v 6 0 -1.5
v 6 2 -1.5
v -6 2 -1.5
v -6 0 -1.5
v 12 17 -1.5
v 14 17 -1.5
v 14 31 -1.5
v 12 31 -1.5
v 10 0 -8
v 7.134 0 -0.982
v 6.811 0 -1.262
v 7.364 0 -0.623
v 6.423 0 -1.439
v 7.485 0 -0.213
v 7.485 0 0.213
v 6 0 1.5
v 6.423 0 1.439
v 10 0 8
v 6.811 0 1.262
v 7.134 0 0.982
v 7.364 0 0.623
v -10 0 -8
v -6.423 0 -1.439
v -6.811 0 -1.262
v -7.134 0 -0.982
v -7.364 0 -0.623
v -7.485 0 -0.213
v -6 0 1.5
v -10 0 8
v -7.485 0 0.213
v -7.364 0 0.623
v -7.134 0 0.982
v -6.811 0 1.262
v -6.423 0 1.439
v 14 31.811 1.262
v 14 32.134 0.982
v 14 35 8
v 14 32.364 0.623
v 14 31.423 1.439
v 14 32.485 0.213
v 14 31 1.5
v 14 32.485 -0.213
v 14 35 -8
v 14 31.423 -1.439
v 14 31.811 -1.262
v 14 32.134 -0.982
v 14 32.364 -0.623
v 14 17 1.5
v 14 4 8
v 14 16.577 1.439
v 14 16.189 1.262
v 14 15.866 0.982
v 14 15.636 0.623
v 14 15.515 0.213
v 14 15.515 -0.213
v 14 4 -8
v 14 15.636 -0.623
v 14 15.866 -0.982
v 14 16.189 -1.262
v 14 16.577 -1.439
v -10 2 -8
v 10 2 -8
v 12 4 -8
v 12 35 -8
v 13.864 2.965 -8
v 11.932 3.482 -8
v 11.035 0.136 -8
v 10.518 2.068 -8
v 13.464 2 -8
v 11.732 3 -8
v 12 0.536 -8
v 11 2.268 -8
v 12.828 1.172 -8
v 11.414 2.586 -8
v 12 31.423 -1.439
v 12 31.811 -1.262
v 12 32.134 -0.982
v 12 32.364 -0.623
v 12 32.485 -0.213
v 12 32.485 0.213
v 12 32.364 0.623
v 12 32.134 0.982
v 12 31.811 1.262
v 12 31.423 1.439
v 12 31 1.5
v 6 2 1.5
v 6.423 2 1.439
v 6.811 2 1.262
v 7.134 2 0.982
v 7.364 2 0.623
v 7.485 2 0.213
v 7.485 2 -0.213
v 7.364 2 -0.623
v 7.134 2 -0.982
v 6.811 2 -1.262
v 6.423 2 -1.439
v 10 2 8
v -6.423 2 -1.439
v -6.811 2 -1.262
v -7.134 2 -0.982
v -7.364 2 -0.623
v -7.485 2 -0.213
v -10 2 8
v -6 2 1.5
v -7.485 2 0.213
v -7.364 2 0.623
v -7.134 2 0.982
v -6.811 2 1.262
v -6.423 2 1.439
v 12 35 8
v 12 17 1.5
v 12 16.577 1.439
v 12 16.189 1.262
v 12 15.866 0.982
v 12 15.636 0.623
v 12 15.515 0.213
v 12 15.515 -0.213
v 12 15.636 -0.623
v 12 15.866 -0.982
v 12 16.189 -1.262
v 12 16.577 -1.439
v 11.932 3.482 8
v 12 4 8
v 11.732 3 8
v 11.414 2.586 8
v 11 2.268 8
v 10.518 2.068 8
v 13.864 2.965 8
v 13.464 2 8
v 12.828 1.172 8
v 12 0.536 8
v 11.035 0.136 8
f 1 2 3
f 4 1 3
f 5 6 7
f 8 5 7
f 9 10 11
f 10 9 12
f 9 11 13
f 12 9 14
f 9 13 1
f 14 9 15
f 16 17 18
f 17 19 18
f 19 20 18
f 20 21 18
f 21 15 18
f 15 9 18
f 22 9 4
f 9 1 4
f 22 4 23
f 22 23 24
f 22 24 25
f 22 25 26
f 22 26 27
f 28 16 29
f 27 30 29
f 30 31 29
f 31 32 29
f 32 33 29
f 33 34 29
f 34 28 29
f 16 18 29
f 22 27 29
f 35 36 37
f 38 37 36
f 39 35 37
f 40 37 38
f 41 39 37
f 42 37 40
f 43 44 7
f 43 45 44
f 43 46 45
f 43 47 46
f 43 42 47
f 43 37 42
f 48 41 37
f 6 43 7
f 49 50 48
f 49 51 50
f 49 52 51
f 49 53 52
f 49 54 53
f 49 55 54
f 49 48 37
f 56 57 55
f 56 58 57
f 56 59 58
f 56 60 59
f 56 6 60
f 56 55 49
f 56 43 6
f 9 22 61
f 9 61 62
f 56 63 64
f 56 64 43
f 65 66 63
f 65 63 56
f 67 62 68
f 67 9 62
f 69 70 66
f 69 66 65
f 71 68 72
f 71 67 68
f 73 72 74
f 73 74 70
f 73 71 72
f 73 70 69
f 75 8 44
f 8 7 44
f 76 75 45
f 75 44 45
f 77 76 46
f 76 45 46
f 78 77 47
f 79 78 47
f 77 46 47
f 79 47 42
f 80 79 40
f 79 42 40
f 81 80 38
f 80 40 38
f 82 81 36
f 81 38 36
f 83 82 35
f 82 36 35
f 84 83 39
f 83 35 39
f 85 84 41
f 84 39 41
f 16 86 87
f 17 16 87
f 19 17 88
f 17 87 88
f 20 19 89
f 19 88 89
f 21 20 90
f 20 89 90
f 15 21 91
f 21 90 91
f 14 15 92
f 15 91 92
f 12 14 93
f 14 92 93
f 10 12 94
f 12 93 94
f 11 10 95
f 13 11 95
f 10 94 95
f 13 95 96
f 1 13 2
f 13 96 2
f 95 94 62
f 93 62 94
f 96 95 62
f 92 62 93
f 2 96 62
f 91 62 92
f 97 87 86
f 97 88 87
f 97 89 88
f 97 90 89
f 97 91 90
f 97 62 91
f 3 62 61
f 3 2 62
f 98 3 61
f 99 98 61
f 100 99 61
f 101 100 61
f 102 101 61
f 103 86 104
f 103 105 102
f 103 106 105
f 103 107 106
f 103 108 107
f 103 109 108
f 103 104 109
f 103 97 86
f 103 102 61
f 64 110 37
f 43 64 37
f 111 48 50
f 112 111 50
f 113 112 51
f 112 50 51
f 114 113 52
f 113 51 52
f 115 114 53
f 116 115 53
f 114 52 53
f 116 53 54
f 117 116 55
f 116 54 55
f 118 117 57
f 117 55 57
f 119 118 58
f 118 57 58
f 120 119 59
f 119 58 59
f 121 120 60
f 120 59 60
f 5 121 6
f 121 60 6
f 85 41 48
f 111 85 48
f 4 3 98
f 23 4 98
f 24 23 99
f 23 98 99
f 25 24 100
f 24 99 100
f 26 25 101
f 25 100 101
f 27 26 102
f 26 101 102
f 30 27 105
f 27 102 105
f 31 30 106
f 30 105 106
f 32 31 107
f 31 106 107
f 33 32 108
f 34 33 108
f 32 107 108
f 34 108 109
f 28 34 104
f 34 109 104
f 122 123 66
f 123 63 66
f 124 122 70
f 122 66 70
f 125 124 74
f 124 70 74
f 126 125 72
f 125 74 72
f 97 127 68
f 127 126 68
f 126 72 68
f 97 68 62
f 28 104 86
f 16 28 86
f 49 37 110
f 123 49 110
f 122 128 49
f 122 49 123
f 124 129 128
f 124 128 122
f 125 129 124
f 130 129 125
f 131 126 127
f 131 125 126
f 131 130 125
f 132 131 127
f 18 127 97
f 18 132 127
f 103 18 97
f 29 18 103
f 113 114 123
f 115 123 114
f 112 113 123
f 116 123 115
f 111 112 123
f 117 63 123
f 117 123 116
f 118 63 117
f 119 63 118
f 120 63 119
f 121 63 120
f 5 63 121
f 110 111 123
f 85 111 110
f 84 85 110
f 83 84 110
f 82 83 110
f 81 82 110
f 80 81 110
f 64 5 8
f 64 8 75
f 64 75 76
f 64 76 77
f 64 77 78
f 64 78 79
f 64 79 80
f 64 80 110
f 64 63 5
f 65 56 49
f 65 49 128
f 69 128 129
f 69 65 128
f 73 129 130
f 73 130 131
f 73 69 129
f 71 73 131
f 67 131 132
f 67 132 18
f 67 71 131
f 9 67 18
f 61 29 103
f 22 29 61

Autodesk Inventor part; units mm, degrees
ref_plane "YZ Plane" through (0, 0, 0) normal (1, 0, 0) x (0, 1, 0)
ref_plane "XZ Plane" through (0, 0, 0) normal (0, 1, 0) x (-1, 0, 0)
ref_plane "XY Plane" through (0, 0, 0) normal (0, 0, 1) x (1, 0, 0)
sketch "スケッチ1" plane through (0, 0, 0) normal (0, 1, 0) x (-1, 0, 0)
  line L0 (-10, 8) -> (10, 8)
  line L1 (10, 8) -> (10, -8)
  line L2 (10, -8) -> (-10, -8)
  line L3 (-10, -8) -> (-10, 8)
  line L4 (-10, 8) -> (10, -8) construction
  line L5 (10, 8) -> (-10, -8) construction
  point P0 (0, 0)
  dimension "d0" = 20
  dimension "d1" = 16
extrude "プレート1" add sketch "スケッチ1" along normal blind 2
sketch "スケッチ2" plane through (12, 4, -8) normal (1, 0, 0) x (0, 1, 0)
  line L0 (0, 16) -> (0, 0)
  line L1 (0, 0) -> (31, 0)
  line L2 (31, 0) -> (31, 16)
  line L3 (31, 16) -> (0, 16)
edge flange "フランジ1" height 35 angle 90 thickness 2 bend radius 2 thickness toward (1, 0, 0) relief tear relief width 2 relief depth 1 edges at (10, 2, 0) wall of the first edge with corners at (12, 4, 8) (12, 4, -8) (12, 35, -8) (12, 35, 8)
bend "曲げ1"
corner "コーナー1"
sketch "スケッチ3" plane through (14, 35, 8) normal (1, 0, 0) x (0, 0, -1)
  line L0 (6.5, -4) -> (6.5, -18)
  arc A0 (6.5, -18) -> (9.5, -18) centre (8, -18) ccw
  line L1 (9.5, -18) -> (9.5, -4)
  arc A1 (9.5, -4) -> (6.5, -4) centre (8, -4) ccw
  line L2 (16, 0) -> (16, -31) projected
  line L3 (0, 0) -> (16, 0) projected
  point P0 (8, -35)
  point P1 (8, 0)
  dimension "d19" = 1.5
extrude "押し出し1" cut sketch "スケッチ3" against normal blind 10
sketch "スケッチ4" plane through (0, 2, 0) normal (0, 1, 0) x (1, 0, 0)
  line L0 (-6, -1.5) -> (6, -1.5)
  arc A0 (6, -1.5) -> (6, 1.5) centre (6, 0) ccw
  line L1 (6, 1.5) -> (-6, 1.5)
  arc A1 (-6, 1.5) -> (-6, -1.5) centre (-6, 0) ccw
  line L2 (-10, -8) -> (-10, 8) projected
  line L3 (10, 8) -> (10, -8) projected
  point P0 (0, 0)
  dimension "d23" = 4
  dimension "d24" = 4
  dimension "d25" = 1.5
extrude "押し出し2" cut sketch "スケッチ4" against normal blind 10
equation "\"d2\" = Thickness"
equation "\"d3\" = BendReliefWidth"
equation "\"d4\" = BendReliefDepth"
equation "\"d5\" = MinimumRemnant"
equation "\"d6\" = TransitionRadius"
equation "\"d9\" = BendRadius"
equation "\"d10\" = CornerReliefSize"
equation "\"d11\" = GapSize"
equation "\"d12\" = JacobiRadiusSize"
equation "\"BendRadius\" = Thickness"
equation "\"BendReliefWidth\" = Thickness"
equation "\"BendReliefDepth\" = 0.5 * Thickness"
equation "\"CornerReliefSize\" = 4 * Thickness"
equation "\"MinimumRemnant\" = 2 * Thickness"
equation "\"TransitionRadius\" = BendRadius"
equation "\"JacobiRadiusSize\" = BendRadius"
equation "\"GapSize\" = Thickness"
equation "\"Thickness\" = 2"
properties part number "keyL_large" material "アルミニウム 6061"
